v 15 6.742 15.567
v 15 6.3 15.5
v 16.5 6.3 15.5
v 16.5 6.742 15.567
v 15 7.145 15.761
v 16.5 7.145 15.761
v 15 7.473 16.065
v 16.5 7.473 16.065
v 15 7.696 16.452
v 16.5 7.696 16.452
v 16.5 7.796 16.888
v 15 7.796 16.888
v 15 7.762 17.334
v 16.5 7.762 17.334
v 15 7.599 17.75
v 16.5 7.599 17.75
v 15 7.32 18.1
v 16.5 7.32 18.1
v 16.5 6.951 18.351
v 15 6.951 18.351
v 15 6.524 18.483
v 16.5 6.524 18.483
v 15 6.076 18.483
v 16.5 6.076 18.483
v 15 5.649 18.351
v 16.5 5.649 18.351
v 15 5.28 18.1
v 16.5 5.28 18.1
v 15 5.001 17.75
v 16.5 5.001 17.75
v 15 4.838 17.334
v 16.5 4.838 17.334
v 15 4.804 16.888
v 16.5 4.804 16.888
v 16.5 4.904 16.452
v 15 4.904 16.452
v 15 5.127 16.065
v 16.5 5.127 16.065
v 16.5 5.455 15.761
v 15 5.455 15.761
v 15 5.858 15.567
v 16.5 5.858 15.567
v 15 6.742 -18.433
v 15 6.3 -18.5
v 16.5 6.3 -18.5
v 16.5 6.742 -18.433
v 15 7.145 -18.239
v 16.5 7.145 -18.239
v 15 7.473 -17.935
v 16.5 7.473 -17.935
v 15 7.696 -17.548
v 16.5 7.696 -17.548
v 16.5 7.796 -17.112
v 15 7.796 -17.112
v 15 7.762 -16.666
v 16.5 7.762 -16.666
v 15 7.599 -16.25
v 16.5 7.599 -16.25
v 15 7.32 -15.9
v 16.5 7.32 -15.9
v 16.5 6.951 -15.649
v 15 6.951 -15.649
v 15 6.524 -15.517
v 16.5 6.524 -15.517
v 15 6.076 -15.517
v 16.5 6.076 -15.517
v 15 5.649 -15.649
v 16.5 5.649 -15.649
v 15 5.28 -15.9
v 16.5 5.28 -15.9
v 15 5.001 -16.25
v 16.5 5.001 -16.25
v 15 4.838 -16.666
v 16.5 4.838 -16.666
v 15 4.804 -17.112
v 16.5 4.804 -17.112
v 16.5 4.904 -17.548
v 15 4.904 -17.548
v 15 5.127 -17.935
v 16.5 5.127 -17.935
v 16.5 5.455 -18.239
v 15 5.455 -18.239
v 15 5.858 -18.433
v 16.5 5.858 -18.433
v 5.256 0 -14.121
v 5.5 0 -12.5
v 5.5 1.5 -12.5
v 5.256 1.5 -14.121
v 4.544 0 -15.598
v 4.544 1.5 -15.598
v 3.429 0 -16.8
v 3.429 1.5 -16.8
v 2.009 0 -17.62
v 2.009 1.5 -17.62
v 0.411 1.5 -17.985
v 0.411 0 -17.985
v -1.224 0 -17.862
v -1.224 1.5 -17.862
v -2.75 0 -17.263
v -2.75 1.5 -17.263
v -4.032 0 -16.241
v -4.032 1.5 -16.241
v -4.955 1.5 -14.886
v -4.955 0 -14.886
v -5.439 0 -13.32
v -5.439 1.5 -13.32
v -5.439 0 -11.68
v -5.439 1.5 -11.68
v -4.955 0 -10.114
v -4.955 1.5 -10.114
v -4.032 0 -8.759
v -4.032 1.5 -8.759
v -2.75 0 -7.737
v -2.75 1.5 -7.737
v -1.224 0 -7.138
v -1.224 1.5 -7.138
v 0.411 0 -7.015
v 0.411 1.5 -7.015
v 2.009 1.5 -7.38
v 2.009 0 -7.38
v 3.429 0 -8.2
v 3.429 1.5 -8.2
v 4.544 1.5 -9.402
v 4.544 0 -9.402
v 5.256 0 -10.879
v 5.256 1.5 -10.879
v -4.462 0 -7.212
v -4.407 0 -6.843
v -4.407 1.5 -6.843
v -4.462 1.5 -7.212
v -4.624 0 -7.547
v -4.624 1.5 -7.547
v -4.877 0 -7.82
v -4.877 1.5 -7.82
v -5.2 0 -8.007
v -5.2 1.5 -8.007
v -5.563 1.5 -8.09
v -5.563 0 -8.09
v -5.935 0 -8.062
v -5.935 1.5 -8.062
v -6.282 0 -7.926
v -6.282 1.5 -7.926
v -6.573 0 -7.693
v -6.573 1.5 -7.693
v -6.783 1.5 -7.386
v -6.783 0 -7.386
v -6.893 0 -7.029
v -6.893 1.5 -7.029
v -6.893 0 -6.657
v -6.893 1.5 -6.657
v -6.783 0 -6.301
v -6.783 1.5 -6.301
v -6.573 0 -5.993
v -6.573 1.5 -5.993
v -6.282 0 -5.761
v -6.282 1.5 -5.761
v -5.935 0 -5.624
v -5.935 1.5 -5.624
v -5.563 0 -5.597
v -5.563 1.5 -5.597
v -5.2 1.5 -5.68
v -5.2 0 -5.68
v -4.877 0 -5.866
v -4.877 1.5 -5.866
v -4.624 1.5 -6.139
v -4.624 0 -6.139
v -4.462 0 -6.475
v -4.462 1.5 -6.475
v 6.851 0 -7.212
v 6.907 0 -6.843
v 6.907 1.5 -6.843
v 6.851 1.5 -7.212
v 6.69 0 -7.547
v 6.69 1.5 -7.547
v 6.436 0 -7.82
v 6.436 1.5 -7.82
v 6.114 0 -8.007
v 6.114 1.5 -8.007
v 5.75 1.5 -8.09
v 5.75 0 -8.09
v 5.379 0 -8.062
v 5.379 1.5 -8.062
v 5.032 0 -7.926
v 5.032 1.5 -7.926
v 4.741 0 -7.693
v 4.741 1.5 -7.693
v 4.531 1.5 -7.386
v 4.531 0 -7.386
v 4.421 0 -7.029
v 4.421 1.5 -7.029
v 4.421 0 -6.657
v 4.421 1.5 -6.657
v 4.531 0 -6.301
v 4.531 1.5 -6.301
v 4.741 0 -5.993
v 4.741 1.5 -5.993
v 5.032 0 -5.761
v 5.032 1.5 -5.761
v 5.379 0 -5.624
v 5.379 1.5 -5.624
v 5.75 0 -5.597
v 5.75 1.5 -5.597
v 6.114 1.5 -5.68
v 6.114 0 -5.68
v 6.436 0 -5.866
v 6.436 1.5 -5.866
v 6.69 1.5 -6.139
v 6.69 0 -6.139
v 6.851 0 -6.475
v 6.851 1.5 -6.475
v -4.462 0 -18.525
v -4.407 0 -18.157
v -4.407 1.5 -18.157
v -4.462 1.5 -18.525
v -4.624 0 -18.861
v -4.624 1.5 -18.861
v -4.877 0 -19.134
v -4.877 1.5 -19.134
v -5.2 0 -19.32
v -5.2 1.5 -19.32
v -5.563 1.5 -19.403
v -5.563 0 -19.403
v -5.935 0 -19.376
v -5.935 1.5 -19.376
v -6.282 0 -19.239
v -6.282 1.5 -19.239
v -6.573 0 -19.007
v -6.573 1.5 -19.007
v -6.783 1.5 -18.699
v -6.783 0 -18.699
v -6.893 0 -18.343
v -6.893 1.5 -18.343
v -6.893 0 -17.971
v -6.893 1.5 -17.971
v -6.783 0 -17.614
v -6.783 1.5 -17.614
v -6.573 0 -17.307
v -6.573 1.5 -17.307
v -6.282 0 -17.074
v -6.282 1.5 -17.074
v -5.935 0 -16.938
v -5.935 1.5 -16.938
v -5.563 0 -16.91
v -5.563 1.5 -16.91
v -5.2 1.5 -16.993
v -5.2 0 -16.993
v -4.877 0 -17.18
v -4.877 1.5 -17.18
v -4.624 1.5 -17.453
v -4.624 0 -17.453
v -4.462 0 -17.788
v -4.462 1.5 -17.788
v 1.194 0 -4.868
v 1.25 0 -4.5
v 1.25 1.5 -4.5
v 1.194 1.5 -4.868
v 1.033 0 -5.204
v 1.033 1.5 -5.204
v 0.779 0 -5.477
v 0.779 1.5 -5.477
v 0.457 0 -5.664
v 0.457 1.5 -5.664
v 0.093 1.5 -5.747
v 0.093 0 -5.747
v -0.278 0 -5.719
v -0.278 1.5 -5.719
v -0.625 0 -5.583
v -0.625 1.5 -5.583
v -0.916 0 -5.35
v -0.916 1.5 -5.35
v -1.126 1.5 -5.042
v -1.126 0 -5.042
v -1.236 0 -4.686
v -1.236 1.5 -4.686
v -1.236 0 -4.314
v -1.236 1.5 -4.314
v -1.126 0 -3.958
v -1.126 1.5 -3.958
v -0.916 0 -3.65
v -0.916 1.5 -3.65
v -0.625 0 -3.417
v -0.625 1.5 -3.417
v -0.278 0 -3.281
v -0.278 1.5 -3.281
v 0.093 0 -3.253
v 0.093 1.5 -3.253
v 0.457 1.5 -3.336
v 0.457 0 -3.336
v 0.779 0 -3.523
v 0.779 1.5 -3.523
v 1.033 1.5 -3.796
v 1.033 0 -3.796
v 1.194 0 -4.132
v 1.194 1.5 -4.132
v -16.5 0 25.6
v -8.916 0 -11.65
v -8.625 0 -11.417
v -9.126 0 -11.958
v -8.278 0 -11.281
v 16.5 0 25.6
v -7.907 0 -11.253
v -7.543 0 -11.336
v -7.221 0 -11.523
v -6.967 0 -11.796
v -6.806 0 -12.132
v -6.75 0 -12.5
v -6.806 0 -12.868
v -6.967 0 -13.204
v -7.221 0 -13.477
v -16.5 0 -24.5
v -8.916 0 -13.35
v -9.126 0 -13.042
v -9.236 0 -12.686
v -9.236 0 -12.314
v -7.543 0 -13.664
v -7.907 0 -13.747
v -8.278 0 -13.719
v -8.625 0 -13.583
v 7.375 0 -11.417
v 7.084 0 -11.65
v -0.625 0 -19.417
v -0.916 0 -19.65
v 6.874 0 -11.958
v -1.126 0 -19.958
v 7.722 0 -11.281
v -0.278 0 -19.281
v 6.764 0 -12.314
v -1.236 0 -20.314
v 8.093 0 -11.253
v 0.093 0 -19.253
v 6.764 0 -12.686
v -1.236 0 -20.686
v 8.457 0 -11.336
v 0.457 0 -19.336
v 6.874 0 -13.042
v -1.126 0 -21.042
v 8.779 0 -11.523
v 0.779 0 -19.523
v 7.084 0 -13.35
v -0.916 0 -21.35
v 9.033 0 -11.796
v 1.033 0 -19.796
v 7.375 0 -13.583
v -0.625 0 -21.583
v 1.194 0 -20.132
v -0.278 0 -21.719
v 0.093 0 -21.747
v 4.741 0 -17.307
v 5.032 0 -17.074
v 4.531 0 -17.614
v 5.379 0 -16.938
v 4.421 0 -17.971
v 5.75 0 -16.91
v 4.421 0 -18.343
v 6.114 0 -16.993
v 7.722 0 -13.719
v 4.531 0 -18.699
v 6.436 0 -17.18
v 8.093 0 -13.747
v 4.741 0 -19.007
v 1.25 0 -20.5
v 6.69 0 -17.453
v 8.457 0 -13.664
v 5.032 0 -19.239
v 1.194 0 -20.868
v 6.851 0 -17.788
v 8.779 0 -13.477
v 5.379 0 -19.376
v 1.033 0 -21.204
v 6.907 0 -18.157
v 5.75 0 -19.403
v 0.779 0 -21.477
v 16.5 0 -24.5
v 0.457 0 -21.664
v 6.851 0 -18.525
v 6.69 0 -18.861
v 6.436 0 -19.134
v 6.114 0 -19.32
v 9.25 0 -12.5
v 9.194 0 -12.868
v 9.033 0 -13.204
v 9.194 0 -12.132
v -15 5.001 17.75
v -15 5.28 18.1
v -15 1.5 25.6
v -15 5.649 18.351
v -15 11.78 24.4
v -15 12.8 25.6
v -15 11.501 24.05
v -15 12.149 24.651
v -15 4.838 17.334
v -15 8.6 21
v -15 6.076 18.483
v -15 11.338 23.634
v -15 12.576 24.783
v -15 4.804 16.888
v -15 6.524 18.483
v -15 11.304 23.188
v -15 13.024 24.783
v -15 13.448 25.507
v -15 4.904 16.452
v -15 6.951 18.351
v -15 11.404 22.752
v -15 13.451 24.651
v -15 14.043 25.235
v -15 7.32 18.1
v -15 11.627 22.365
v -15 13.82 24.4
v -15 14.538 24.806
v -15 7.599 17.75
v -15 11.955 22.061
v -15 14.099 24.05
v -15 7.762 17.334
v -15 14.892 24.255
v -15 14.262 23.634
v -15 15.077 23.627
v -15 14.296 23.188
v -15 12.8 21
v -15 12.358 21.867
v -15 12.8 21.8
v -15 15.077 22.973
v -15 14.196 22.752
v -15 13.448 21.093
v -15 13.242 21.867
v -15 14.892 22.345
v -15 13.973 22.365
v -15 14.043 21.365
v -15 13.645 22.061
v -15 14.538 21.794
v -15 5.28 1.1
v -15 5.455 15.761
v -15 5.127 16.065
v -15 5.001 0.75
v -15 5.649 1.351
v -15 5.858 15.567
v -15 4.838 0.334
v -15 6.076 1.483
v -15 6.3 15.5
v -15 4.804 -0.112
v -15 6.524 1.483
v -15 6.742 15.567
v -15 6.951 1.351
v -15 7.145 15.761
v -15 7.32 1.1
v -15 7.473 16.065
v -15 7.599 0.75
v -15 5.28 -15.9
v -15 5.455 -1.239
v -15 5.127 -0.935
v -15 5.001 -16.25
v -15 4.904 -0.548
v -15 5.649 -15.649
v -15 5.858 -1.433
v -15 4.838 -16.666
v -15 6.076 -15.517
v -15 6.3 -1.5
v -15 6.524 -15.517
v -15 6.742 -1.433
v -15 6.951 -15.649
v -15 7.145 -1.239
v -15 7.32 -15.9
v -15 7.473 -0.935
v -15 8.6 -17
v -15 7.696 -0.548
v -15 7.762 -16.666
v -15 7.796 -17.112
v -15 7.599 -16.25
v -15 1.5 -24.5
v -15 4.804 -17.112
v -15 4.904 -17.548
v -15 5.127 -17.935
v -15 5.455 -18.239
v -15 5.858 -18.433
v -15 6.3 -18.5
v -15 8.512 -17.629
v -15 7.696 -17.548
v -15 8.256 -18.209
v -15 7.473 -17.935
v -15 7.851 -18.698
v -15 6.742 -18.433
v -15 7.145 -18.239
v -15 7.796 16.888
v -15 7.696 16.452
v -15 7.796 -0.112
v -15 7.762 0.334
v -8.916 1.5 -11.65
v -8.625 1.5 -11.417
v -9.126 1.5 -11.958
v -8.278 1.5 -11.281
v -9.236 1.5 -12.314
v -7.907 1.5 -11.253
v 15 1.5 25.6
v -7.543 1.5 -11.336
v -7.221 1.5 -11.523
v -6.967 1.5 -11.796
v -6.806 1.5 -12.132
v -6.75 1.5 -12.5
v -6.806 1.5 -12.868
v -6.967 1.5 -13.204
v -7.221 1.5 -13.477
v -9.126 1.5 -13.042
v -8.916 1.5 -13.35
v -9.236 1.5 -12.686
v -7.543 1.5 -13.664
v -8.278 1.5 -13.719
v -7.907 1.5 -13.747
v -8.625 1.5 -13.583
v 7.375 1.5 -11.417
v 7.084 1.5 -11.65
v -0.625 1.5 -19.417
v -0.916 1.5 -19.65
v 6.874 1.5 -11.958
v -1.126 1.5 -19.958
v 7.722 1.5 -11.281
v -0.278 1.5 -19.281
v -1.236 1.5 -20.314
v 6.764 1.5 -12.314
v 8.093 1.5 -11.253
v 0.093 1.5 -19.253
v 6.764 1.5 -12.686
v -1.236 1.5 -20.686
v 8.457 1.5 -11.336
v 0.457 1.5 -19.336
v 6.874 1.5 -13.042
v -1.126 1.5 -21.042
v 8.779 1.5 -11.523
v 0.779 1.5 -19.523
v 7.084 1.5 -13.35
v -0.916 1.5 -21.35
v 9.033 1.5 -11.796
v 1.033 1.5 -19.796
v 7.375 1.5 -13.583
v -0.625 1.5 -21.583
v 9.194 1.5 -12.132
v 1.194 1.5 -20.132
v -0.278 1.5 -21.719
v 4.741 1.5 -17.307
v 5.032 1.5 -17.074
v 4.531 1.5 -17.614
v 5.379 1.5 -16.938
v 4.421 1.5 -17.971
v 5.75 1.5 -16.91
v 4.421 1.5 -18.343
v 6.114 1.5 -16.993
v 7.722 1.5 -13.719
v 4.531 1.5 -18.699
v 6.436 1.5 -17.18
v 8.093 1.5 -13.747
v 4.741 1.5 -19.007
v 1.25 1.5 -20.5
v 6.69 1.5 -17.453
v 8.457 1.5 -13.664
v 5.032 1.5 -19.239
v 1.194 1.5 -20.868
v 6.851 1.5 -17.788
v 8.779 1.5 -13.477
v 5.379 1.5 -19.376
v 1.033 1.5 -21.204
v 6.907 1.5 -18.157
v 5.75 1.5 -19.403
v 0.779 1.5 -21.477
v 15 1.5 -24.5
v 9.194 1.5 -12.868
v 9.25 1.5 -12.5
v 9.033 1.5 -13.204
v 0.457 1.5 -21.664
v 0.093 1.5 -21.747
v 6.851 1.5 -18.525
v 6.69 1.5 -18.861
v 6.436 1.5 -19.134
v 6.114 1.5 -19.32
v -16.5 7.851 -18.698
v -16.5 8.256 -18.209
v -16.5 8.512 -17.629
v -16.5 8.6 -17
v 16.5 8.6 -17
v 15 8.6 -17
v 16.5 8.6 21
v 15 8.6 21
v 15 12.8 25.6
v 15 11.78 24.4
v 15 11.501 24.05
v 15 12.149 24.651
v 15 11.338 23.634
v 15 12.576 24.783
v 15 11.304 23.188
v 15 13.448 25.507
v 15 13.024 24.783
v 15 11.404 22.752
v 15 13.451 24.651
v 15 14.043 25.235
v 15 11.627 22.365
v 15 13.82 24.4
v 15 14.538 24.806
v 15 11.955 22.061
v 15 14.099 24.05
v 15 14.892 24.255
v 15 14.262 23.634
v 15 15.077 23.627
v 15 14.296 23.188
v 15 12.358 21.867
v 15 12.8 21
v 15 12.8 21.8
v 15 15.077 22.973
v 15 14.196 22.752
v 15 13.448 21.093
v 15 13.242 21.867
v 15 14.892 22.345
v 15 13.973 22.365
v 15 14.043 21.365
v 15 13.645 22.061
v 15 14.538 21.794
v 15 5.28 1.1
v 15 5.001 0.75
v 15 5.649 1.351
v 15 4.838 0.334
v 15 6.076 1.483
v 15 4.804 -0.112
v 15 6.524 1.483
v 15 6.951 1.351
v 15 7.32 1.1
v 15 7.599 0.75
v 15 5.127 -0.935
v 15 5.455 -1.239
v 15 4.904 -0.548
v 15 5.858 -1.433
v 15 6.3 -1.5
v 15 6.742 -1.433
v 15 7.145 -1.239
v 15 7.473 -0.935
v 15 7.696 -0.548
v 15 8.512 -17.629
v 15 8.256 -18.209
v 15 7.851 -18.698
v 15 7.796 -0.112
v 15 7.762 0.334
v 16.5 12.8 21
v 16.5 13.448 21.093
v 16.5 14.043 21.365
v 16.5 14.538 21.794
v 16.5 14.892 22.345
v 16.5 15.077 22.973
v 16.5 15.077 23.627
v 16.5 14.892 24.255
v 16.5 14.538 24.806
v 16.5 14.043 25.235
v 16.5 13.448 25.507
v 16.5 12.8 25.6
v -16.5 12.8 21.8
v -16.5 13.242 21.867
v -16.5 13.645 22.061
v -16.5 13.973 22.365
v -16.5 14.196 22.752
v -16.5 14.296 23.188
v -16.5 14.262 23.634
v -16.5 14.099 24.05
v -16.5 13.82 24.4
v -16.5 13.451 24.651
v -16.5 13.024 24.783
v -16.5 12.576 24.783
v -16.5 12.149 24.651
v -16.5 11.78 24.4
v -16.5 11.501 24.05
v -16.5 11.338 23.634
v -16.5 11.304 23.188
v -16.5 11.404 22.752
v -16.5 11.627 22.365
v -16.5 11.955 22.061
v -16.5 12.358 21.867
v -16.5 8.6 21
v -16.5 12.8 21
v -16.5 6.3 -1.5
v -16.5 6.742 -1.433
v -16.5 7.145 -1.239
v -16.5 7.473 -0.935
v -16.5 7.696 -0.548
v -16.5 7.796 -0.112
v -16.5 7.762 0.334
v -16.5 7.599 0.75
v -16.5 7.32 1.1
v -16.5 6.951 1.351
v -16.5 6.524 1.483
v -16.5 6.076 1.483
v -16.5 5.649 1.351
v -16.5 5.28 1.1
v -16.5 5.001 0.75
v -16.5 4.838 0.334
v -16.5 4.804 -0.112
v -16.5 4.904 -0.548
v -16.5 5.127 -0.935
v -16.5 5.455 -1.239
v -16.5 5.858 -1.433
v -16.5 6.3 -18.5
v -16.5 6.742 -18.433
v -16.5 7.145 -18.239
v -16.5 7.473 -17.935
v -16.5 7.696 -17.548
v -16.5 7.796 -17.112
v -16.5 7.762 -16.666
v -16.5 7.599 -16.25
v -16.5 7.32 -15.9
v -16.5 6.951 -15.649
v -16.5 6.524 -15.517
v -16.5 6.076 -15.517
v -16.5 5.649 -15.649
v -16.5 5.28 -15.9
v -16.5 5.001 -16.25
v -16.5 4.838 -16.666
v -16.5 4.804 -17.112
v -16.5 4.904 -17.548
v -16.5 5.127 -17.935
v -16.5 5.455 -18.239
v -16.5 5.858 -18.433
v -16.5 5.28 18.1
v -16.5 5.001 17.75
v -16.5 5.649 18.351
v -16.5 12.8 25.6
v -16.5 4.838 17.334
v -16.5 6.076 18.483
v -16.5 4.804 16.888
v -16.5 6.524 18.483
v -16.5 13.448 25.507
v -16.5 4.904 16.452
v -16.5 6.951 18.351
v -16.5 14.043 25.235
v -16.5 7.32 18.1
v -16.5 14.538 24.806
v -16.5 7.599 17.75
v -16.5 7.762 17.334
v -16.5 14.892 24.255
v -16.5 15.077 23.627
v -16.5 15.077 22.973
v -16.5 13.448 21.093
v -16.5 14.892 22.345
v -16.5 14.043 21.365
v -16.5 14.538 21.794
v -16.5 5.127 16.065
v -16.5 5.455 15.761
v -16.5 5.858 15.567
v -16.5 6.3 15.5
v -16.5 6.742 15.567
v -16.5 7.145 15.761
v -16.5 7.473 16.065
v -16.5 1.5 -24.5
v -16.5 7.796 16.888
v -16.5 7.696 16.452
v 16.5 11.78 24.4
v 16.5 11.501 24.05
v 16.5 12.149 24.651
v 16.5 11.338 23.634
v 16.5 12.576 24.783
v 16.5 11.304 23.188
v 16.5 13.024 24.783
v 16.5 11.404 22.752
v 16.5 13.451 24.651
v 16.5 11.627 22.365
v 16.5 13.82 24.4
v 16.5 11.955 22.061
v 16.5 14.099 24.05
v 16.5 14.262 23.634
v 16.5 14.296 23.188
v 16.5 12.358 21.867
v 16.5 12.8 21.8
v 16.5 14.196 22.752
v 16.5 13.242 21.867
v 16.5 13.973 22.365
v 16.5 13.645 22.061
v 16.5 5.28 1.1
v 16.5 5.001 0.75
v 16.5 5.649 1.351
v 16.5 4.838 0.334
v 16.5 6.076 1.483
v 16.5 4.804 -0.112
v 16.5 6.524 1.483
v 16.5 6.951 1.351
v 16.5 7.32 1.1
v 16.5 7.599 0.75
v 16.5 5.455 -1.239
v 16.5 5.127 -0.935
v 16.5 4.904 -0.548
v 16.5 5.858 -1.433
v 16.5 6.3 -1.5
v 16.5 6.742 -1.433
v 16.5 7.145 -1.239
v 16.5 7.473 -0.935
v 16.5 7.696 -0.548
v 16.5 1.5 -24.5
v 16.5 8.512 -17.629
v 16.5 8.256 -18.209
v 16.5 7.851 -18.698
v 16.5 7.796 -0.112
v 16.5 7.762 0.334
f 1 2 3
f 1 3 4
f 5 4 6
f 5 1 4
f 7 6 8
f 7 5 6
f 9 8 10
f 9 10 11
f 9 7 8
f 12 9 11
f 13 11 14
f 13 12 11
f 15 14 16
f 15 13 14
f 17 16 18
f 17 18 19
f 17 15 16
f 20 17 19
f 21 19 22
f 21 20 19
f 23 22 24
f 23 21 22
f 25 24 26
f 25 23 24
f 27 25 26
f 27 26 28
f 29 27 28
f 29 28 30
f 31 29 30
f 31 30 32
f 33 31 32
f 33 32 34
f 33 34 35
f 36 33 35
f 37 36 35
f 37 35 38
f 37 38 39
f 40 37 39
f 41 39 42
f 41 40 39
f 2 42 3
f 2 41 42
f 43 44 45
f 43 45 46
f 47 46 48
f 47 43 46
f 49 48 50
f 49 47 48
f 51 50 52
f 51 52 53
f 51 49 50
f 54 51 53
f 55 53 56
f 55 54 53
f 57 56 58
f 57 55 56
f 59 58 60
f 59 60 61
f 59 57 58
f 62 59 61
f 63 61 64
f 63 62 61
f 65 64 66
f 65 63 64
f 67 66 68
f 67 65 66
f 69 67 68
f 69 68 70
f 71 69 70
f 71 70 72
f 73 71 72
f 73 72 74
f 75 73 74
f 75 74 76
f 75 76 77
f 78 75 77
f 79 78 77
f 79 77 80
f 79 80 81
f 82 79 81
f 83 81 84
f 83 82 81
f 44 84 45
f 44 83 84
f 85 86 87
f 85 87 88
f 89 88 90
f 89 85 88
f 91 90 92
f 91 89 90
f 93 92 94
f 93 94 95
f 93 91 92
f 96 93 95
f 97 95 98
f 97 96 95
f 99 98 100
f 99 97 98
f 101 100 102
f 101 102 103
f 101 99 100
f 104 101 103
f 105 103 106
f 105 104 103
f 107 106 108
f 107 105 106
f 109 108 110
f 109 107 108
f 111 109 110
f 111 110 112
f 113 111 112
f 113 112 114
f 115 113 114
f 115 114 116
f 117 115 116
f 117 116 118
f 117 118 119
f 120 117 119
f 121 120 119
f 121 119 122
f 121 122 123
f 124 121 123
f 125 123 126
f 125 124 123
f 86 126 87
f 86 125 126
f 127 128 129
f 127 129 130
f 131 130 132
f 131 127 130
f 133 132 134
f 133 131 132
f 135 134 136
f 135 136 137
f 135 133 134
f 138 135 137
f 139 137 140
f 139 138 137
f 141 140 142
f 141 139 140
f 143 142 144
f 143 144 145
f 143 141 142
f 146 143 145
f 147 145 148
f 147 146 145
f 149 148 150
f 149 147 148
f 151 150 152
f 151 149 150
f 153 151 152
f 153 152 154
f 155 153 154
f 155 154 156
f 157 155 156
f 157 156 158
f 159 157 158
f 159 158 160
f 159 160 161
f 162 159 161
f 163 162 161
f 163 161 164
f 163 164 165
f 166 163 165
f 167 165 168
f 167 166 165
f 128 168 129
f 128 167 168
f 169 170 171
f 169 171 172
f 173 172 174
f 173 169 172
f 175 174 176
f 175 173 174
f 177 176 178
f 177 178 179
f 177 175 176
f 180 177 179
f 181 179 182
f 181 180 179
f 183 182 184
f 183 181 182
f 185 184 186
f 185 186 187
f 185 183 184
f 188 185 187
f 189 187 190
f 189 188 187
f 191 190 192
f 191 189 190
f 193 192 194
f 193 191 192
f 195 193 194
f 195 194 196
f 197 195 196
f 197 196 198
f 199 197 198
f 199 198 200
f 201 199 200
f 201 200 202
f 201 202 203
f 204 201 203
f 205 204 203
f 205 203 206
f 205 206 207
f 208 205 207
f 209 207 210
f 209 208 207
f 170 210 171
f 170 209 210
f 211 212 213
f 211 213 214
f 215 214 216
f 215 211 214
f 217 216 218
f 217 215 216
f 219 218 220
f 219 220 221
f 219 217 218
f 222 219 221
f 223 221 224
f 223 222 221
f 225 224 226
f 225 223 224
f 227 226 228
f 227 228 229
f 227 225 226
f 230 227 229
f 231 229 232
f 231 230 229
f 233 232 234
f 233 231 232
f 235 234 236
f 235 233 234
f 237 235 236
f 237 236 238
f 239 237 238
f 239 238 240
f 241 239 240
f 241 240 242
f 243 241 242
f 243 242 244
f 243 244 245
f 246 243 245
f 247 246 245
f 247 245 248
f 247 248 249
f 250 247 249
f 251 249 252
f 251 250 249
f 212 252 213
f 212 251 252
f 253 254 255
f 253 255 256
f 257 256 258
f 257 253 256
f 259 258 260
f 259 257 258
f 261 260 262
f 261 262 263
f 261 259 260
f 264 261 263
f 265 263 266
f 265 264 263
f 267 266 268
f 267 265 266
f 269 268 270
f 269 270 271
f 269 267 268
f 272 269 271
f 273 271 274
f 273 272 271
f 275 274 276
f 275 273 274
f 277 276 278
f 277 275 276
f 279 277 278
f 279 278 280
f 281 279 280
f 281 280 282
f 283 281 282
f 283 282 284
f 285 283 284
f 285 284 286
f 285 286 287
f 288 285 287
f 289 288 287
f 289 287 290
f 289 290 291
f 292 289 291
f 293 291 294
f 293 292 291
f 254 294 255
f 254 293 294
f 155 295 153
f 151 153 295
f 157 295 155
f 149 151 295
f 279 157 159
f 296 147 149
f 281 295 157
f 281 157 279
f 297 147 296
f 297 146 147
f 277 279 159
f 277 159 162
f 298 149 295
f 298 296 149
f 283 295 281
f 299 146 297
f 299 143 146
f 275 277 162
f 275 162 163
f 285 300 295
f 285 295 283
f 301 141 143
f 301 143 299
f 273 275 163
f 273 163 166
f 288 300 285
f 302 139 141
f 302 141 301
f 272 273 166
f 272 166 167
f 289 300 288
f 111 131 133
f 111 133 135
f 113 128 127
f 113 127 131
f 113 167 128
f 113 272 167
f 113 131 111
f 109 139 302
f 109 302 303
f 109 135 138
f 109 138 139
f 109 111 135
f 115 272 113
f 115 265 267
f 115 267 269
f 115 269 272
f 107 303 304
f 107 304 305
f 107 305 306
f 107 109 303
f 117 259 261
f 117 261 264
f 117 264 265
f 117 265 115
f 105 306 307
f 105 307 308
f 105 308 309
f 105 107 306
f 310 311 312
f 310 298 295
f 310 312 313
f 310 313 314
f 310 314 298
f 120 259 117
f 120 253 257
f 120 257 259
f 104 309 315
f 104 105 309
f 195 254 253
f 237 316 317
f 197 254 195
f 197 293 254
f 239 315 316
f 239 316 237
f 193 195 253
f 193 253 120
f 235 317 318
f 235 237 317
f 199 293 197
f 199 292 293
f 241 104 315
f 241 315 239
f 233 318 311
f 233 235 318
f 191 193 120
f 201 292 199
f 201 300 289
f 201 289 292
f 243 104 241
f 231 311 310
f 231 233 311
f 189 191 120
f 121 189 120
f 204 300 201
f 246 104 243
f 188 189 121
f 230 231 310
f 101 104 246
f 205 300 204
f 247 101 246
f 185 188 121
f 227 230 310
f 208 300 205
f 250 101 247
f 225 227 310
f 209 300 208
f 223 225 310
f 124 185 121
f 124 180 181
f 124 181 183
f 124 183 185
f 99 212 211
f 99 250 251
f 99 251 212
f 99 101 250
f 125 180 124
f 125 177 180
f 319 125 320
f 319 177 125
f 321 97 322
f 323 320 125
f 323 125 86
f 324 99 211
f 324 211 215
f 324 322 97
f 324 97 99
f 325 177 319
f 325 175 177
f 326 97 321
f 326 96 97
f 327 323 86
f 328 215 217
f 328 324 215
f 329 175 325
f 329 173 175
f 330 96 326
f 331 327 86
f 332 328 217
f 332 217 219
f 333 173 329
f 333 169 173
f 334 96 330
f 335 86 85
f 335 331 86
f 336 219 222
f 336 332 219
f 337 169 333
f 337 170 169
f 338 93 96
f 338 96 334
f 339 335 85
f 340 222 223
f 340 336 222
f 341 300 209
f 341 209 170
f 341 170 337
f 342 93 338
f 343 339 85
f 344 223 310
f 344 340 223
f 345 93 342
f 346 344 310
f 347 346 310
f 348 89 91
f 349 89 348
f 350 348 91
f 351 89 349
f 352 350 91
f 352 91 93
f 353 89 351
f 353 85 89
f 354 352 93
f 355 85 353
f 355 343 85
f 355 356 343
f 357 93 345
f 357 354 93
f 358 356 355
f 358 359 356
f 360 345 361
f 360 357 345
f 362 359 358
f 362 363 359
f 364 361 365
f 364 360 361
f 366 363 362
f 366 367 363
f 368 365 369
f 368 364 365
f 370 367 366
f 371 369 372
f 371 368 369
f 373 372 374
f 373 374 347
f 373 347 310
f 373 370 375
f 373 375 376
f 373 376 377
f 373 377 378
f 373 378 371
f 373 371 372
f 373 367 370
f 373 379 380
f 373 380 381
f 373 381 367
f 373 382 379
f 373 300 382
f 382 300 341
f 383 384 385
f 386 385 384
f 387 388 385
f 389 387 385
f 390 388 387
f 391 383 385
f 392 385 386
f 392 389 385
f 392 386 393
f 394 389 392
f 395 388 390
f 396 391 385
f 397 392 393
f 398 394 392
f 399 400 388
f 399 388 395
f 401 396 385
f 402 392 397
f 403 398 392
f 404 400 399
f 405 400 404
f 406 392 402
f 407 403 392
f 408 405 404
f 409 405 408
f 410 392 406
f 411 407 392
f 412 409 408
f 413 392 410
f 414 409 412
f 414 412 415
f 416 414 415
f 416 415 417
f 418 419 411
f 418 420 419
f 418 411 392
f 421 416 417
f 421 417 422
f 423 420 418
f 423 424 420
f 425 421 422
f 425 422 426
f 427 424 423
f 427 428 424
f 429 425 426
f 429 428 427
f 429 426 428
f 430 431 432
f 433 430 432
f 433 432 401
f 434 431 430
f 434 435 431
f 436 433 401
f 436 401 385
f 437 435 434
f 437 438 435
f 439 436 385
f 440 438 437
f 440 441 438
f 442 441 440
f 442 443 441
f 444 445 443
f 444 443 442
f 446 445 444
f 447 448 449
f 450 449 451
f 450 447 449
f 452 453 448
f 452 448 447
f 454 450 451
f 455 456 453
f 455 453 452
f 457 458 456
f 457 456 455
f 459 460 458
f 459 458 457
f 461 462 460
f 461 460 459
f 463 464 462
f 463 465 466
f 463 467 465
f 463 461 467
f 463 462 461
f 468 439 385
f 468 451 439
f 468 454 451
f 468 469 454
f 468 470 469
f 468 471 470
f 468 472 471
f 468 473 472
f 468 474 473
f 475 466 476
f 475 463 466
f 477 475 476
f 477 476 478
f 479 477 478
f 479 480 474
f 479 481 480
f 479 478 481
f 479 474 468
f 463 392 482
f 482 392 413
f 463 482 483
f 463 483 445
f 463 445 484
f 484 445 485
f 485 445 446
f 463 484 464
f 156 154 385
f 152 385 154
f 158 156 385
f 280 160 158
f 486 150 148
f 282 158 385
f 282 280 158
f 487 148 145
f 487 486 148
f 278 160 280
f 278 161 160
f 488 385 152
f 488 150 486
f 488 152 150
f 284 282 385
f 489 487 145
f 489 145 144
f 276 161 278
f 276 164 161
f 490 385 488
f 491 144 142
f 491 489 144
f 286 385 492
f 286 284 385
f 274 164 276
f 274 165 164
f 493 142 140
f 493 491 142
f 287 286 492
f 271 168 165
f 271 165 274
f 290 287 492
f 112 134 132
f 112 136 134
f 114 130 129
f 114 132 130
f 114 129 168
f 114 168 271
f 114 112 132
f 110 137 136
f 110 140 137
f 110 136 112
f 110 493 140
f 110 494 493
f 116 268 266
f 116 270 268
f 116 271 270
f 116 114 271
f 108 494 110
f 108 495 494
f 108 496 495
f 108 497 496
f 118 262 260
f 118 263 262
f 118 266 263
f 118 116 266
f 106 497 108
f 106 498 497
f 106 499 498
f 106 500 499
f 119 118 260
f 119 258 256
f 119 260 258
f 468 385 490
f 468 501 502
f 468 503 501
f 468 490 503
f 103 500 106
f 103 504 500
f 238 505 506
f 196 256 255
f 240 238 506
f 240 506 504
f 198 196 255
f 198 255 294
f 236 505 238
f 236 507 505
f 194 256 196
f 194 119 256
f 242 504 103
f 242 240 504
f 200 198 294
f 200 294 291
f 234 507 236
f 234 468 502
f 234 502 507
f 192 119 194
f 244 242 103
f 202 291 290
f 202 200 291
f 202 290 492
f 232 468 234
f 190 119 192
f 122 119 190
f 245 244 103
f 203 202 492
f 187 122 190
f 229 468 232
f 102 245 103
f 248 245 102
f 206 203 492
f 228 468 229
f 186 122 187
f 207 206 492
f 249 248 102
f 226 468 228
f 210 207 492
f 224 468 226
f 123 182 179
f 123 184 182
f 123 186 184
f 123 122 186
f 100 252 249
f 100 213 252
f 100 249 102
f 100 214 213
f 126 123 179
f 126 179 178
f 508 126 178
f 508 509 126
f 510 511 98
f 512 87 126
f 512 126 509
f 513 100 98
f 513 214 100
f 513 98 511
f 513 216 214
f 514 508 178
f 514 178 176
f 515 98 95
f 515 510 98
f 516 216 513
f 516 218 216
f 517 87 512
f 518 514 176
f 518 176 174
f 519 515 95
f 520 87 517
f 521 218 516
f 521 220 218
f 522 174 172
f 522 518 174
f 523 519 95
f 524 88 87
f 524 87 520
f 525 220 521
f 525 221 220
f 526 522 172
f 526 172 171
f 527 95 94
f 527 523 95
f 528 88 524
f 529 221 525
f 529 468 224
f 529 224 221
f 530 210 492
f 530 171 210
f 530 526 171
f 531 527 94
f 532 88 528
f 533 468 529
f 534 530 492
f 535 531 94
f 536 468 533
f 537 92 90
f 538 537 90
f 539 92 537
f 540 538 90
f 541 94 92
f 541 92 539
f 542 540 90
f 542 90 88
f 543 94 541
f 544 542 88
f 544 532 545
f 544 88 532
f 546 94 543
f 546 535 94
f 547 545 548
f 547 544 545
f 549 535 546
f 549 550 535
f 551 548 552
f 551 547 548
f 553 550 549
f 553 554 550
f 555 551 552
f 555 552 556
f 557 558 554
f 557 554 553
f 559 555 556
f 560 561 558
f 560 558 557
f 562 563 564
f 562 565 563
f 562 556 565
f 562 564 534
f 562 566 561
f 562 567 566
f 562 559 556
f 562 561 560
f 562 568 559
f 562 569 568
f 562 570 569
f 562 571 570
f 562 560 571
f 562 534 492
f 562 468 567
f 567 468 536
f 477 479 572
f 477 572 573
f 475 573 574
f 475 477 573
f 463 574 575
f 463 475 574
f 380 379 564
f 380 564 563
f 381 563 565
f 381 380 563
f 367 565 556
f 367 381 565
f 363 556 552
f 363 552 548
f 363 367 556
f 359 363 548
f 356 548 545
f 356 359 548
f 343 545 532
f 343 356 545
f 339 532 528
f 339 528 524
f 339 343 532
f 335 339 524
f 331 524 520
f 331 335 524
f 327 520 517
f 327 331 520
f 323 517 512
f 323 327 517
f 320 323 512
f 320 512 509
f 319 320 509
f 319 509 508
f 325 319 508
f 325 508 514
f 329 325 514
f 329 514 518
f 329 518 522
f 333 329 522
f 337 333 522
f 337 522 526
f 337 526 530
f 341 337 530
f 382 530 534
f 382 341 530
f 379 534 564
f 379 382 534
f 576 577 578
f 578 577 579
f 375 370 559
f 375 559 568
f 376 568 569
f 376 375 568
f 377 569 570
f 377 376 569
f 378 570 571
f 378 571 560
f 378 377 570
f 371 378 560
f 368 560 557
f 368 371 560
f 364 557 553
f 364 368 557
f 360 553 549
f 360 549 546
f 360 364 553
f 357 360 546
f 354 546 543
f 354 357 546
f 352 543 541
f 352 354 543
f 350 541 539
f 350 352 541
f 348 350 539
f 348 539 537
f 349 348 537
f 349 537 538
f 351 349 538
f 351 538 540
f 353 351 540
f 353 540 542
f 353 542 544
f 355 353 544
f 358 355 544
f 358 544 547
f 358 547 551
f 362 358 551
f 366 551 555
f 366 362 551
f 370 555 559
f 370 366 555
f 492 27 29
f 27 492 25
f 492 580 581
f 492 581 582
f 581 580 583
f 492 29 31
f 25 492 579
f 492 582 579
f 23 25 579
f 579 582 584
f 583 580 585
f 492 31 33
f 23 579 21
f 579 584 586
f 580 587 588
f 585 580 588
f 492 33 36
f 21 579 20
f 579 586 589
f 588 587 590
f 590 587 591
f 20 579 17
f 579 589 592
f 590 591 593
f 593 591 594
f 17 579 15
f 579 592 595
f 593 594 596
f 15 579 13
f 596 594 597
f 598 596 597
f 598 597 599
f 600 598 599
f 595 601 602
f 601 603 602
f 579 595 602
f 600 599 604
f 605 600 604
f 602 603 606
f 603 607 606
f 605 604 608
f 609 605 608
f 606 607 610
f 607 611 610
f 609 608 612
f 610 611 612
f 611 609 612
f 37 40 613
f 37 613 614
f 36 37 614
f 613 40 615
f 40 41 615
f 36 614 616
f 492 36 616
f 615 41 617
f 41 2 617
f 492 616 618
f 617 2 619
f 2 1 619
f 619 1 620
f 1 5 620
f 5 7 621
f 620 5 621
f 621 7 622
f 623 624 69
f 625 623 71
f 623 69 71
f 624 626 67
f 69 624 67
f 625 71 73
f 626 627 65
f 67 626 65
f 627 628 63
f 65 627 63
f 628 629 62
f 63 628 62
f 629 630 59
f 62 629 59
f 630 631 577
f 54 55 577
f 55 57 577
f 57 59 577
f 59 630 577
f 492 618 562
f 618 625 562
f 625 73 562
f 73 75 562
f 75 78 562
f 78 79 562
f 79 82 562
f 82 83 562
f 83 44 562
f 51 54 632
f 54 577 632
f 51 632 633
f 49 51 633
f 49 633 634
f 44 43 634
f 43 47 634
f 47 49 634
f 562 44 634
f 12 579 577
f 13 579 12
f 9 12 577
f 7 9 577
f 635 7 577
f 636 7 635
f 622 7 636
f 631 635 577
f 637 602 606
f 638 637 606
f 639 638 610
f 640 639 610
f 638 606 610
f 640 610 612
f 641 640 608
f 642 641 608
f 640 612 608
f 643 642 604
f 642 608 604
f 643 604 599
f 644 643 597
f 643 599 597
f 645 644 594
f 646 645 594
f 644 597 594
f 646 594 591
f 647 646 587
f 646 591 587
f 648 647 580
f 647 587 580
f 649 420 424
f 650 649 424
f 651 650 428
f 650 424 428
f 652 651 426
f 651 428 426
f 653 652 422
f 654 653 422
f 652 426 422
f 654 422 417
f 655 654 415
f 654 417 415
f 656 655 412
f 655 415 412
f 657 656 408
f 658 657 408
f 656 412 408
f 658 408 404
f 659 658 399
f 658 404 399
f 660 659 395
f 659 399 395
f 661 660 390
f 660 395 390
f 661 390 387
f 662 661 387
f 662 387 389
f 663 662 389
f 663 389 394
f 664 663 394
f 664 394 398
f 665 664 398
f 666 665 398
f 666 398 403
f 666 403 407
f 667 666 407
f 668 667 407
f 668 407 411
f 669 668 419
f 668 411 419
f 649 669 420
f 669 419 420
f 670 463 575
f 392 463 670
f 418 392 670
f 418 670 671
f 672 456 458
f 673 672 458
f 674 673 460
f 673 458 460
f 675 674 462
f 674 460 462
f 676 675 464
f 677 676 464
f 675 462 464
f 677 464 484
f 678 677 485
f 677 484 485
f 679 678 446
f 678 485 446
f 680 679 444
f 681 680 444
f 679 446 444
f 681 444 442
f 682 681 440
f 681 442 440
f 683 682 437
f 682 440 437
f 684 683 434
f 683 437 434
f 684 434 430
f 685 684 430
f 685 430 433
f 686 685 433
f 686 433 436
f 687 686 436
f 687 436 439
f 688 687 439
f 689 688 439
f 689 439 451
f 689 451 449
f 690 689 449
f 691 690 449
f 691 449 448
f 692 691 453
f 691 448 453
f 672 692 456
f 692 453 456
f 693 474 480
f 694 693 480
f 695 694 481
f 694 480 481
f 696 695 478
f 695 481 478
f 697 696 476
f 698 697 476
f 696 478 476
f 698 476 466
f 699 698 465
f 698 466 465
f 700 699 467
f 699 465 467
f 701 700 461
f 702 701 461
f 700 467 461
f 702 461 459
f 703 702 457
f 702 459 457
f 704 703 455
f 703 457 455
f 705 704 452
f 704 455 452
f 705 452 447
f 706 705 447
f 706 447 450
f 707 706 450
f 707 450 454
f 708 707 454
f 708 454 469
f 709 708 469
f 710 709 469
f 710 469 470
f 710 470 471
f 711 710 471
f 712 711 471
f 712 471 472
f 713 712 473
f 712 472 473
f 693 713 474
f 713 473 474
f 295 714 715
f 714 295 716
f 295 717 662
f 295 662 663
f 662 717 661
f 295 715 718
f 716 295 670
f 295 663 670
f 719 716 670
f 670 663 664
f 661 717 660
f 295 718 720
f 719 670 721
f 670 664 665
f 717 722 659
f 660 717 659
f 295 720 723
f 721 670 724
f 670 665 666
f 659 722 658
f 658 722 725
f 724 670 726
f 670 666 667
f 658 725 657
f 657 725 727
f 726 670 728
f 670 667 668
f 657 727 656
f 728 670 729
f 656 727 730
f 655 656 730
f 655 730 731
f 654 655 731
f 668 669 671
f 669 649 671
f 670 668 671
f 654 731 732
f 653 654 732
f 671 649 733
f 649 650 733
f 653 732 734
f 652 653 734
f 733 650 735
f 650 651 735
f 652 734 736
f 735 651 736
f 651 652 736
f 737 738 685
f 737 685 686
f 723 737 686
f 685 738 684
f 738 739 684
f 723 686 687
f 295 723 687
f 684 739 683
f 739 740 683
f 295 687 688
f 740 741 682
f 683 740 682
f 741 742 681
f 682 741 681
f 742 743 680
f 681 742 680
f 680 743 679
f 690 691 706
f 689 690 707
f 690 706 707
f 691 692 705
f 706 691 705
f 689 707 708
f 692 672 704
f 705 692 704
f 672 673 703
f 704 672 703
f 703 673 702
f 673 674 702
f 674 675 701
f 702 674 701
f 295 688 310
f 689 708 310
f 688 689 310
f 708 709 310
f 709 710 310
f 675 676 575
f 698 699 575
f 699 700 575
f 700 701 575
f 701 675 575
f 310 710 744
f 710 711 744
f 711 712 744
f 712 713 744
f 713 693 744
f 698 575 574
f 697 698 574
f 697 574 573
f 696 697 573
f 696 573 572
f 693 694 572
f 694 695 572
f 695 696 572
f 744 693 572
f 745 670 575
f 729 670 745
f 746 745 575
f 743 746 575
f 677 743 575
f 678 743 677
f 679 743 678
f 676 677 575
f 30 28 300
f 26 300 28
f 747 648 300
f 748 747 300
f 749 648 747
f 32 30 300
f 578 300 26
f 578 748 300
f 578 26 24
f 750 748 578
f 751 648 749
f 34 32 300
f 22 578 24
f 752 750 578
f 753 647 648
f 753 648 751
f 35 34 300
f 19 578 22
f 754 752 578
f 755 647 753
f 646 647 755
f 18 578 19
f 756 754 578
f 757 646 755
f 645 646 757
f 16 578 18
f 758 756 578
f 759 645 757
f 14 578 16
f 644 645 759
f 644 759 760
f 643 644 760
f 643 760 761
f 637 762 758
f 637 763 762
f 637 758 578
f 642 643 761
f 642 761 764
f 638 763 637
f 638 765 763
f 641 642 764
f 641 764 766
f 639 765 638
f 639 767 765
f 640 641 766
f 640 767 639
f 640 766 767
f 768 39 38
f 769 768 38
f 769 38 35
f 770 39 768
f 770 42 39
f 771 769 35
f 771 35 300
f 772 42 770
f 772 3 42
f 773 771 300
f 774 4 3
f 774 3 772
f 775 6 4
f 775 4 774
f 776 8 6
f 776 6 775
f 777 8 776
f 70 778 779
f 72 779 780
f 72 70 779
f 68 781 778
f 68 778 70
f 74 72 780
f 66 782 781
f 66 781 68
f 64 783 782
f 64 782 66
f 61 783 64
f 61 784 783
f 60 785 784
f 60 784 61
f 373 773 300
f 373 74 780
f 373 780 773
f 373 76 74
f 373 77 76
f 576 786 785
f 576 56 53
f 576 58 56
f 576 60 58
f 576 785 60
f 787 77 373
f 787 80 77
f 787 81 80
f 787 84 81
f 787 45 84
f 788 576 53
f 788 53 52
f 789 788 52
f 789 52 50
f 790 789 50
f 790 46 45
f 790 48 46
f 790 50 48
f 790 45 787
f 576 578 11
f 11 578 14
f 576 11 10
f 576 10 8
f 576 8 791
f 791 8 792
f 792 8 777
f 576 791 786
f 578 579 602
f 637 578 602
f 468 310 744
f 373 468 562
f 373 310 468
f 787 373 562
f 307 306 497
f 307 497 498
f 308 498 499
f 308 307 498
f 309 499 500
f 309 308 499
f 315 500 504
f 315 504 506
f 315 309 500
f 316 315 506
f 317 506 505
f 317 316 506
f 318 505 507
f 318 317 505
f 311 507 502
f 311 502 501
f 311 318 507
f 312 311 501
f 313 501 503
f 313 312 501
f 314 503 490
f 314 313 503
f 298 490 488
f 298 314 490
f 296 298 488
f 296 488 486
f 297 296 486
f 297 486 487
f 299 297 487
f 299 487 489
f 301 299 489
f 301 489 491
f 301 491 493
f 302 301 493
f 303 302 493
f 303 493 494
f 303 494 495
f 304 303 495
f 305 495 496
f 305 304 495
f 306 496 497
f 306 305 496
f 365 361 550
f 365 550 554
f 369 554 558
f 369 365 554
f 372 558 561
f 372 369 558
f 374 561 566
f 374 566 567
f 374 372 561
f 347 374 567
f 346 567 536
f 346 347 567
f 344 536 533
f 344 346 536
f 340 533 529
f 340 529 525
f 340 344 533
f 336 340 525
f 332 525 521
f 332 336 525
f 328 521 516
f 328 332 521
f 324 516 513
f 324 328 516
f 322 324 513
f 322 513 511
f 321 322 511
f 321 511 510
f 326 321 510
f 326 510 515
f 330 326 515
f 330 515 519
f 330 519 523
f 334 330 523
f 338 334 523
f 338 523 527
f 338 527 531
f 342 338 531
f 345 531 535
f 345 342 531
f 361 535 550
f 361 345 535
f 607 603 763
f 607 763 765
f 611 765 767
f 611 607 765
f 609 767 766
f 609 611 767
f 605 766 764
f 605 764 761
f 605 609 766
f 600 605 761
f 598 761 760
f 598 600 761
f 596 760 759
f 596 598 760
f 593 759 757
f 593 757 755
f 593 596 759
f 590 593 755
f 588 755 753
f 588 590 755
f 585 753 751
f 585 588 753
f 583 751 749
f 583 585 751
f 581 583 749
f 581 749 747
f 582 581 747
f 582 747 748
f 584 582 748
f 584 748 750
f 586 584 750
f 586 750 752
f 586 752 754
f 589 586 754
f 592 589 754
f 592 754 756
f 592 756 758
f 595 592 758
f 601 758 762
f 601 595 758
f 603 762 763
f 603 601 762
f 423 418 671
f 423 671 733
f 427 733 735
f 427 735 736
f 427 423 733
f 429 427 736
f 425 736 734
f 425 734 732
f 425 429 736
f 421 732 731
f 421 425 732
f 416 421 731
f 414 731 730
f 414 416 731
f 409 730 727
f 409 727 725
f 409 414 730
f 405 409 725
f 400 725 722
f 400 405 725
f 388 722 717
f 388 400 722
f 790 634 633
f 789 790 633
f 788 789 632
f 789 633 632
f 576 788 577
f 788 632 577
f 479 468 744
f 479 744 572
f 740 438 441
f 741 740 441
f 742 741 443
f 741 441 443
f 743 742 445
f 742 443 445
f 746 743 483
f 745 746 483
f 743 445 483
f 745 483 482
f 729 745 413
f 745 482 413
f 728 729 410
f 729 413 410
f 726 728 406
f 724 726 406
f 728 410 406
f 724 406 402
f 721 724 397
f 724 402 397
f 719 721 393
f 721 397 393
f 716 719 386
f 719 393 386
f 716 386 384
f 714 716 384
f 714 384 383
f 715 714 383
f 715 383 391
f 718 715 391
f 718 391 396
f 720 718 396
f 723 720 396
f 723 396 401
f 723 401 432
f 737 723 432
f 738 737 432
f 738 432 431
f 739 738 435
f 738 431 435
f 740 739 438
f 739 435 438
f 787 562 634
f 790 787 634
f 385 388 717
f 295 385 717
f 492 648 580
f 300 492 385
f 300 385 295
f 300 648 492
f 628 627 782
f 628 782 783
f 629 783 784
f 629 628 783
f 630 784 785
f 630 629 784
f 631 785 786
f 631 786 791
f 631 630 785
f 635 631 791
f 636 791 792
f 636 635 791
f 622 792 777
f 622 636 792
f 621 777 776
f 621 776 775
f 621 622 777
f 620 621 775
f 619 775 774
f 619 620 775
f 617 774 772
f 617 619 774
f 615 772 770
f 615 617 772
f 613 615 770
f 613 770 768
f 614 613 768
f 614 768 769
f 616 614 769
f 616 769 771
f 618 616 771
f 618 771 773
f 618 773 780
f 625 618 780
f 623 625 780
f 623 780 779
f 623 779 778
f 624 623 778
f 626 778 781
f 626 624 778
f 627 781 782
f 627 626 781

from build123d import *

# Parameters (mm, degrees)
SKETCH2_W           = 30
SKETCH2_H           = 50.1
SKETCH2_R           = 1.25
SKETCH2_R_2         = 5.5
BOSS_EXTRUDE1_DEPTH = 1.5
BOSS_EXTRUDE2_START = 15
SKETCH3_R           = 1.5
BOSS_EXTRUDE2_DEPTH = 1.5
BOSS_EXTRUDE3_START = -15
SKETCH3_2_R         = 1.5
BOSS_EXTRUDE3_DEPTH = 1.5


with BuildPart() as part:
    # Sketch2 → Boss-Extrude1 (new body)
    with BuildSketch(Plane(origin=(0, 0, 0), x_dir=(1, 0, 0), z_dir=(0, 1, 0))):
        with Locations((0, -0.55)):
            Rectangle(SKETCH2_W, SKETCH2_H)
        with Locations((-8, 12.5)):
            Circle(SKETCH2_R, mode=Mode.SUBTRACT)
        with Locations((-5.656854249, 18.156854249)):
            Circle(SKETCH2_R, mode=Mode.SUBTRACT)
        with Locations((0, 20.5)):
            Circle(SKETCH2_R, mode=Mode.SUBTRACT)
        with Locations((5.656854249, 18.156854249)):
            Circle(SKETCH2_R, mode=Mode.SUBTRACT)
        with Locations((8, 12.5)):
            Circle(SKETCH2_R, mode=Mode.SUBTRACT)
        with Locations((5.656854249, 6.843145751)):
            Circle(SKETCH2_R, mode=Mode.SUBTRACT)
        with Locations((0, 4.5)):
            Circle(SKETCH2_R, mode=Mode.SUBTRACT)
        with Locations((-5.656854249, 6.843145751)):
            Circle(SKETCH2_R, mode=Mode.SUBTRACT)
        with Locations((0, 12.5)):
            Circle(SKETCH2_R_2, mode=Mode.SUBTRACT)
    extrude(amount=BOSS_EXTRUDE1_DEPTH)

    # Sketch3 → Boss-Extrude2 (add)
    with BuildSketch(Plane(origin=(0, 0, 0), x_dir=(0, 0, -1), z_dir=(1, 0, 0)).offset(BOSS_EXTRUDE2_START)):
        with BuildLine():
            Line((24.5, 1.5), (18.69812916, 7.851243689))
            ThreePointArc((18.69812916, 7.851243689), (17.927938335, 8.404502374), (16.99999989, 8.6))
            Line((16.99999989, 8.6), (-21, 8.6))
            Line((-21, 8.6), (-21, 12.8))
            ThreePointArc((-21, 12.8), (-23.3, 15.1), (-25.6, 12.8))
            Line((-25.6, 12.8), (-25.6, 1.5))
            Line((-25.6, 1.5), (-25.6, 0))
            Line((-25.6, 0), (24.5, 0))
            Line((24.5, 0), (24.5, 1.5))
        make_face()
        with Locations((-23.3, 12.8)):
            Circle(SKETCH3_R, mode=Mode.SUBTRACT)
        with Locations((-17.00000011, 6.3)):
            Circle(SKETCH3_R, mode=Mode.SUBTRACT)
        with Locations((-1.1e-07, 6.3)):
            Circle(SKETCH3_R, mode=Mode.SUBTRACT)
        with Locations((16.99999989, 6.3)):
            Circle(SKETCH3_R, mode=Mode.SUBTRACT)
    extrude(amount=BOSS_EXTRUDE2_DEPTH)

    # Sketch3<2> → Boss-Extrude3 (add)
    with BuildSketch(Plane(origin=(0, 0, 0), x_dir=(0, 0, -1), z_dir=(1, 0, 0)).offset(BOSS_EXTRUDE3_START)):
        with BuildLine():
            Line((24.5, 1.5), (18.69812916, 7.851243689))
            ThreePointArc((18.69812916, 7.851243689), (17.927938335, 8.404502374), (16.99999989, 8.6))
            Line((16.99999989, 8.6), (-21, 8.6))
            Line((-21, 8.6), (-21, 12.8))
            ThreePointArc((-21, 12.8), (-23.3, 15.1), (-25.6, 12.8))
            Line((-25.6, 12.8), (-25.6, 1.5))
            Line((-25.6, 1.5), (-25.6, 0))
            Line((-25.6, 0), (24.5, 0))
            Line((24.5, 0), (24.5, 1.5))
        make_face()
        with Locations((-23.3, 12.8)):
            Circle(SKETCH3_2_R, mode=Mode.SUBTRACT)
        with Locations((-17.00000011, 6.3)):
            Circle(SKETCH3_2_R, mode=Mode.SUBTRACT)
        with Locations((-1.1e-07, 6.3)):
            Circle(SKETCH3_2_R, mode=Mode.SUBTRACT)
        with Locations((16.99999989, 6.3)):
            Circle(SKETCH3_2_R, mode=Mode.SUBTRACT)
    extrude(amount=-BOSS_EXTRUDE3_DEPTH)


solid = part.part
